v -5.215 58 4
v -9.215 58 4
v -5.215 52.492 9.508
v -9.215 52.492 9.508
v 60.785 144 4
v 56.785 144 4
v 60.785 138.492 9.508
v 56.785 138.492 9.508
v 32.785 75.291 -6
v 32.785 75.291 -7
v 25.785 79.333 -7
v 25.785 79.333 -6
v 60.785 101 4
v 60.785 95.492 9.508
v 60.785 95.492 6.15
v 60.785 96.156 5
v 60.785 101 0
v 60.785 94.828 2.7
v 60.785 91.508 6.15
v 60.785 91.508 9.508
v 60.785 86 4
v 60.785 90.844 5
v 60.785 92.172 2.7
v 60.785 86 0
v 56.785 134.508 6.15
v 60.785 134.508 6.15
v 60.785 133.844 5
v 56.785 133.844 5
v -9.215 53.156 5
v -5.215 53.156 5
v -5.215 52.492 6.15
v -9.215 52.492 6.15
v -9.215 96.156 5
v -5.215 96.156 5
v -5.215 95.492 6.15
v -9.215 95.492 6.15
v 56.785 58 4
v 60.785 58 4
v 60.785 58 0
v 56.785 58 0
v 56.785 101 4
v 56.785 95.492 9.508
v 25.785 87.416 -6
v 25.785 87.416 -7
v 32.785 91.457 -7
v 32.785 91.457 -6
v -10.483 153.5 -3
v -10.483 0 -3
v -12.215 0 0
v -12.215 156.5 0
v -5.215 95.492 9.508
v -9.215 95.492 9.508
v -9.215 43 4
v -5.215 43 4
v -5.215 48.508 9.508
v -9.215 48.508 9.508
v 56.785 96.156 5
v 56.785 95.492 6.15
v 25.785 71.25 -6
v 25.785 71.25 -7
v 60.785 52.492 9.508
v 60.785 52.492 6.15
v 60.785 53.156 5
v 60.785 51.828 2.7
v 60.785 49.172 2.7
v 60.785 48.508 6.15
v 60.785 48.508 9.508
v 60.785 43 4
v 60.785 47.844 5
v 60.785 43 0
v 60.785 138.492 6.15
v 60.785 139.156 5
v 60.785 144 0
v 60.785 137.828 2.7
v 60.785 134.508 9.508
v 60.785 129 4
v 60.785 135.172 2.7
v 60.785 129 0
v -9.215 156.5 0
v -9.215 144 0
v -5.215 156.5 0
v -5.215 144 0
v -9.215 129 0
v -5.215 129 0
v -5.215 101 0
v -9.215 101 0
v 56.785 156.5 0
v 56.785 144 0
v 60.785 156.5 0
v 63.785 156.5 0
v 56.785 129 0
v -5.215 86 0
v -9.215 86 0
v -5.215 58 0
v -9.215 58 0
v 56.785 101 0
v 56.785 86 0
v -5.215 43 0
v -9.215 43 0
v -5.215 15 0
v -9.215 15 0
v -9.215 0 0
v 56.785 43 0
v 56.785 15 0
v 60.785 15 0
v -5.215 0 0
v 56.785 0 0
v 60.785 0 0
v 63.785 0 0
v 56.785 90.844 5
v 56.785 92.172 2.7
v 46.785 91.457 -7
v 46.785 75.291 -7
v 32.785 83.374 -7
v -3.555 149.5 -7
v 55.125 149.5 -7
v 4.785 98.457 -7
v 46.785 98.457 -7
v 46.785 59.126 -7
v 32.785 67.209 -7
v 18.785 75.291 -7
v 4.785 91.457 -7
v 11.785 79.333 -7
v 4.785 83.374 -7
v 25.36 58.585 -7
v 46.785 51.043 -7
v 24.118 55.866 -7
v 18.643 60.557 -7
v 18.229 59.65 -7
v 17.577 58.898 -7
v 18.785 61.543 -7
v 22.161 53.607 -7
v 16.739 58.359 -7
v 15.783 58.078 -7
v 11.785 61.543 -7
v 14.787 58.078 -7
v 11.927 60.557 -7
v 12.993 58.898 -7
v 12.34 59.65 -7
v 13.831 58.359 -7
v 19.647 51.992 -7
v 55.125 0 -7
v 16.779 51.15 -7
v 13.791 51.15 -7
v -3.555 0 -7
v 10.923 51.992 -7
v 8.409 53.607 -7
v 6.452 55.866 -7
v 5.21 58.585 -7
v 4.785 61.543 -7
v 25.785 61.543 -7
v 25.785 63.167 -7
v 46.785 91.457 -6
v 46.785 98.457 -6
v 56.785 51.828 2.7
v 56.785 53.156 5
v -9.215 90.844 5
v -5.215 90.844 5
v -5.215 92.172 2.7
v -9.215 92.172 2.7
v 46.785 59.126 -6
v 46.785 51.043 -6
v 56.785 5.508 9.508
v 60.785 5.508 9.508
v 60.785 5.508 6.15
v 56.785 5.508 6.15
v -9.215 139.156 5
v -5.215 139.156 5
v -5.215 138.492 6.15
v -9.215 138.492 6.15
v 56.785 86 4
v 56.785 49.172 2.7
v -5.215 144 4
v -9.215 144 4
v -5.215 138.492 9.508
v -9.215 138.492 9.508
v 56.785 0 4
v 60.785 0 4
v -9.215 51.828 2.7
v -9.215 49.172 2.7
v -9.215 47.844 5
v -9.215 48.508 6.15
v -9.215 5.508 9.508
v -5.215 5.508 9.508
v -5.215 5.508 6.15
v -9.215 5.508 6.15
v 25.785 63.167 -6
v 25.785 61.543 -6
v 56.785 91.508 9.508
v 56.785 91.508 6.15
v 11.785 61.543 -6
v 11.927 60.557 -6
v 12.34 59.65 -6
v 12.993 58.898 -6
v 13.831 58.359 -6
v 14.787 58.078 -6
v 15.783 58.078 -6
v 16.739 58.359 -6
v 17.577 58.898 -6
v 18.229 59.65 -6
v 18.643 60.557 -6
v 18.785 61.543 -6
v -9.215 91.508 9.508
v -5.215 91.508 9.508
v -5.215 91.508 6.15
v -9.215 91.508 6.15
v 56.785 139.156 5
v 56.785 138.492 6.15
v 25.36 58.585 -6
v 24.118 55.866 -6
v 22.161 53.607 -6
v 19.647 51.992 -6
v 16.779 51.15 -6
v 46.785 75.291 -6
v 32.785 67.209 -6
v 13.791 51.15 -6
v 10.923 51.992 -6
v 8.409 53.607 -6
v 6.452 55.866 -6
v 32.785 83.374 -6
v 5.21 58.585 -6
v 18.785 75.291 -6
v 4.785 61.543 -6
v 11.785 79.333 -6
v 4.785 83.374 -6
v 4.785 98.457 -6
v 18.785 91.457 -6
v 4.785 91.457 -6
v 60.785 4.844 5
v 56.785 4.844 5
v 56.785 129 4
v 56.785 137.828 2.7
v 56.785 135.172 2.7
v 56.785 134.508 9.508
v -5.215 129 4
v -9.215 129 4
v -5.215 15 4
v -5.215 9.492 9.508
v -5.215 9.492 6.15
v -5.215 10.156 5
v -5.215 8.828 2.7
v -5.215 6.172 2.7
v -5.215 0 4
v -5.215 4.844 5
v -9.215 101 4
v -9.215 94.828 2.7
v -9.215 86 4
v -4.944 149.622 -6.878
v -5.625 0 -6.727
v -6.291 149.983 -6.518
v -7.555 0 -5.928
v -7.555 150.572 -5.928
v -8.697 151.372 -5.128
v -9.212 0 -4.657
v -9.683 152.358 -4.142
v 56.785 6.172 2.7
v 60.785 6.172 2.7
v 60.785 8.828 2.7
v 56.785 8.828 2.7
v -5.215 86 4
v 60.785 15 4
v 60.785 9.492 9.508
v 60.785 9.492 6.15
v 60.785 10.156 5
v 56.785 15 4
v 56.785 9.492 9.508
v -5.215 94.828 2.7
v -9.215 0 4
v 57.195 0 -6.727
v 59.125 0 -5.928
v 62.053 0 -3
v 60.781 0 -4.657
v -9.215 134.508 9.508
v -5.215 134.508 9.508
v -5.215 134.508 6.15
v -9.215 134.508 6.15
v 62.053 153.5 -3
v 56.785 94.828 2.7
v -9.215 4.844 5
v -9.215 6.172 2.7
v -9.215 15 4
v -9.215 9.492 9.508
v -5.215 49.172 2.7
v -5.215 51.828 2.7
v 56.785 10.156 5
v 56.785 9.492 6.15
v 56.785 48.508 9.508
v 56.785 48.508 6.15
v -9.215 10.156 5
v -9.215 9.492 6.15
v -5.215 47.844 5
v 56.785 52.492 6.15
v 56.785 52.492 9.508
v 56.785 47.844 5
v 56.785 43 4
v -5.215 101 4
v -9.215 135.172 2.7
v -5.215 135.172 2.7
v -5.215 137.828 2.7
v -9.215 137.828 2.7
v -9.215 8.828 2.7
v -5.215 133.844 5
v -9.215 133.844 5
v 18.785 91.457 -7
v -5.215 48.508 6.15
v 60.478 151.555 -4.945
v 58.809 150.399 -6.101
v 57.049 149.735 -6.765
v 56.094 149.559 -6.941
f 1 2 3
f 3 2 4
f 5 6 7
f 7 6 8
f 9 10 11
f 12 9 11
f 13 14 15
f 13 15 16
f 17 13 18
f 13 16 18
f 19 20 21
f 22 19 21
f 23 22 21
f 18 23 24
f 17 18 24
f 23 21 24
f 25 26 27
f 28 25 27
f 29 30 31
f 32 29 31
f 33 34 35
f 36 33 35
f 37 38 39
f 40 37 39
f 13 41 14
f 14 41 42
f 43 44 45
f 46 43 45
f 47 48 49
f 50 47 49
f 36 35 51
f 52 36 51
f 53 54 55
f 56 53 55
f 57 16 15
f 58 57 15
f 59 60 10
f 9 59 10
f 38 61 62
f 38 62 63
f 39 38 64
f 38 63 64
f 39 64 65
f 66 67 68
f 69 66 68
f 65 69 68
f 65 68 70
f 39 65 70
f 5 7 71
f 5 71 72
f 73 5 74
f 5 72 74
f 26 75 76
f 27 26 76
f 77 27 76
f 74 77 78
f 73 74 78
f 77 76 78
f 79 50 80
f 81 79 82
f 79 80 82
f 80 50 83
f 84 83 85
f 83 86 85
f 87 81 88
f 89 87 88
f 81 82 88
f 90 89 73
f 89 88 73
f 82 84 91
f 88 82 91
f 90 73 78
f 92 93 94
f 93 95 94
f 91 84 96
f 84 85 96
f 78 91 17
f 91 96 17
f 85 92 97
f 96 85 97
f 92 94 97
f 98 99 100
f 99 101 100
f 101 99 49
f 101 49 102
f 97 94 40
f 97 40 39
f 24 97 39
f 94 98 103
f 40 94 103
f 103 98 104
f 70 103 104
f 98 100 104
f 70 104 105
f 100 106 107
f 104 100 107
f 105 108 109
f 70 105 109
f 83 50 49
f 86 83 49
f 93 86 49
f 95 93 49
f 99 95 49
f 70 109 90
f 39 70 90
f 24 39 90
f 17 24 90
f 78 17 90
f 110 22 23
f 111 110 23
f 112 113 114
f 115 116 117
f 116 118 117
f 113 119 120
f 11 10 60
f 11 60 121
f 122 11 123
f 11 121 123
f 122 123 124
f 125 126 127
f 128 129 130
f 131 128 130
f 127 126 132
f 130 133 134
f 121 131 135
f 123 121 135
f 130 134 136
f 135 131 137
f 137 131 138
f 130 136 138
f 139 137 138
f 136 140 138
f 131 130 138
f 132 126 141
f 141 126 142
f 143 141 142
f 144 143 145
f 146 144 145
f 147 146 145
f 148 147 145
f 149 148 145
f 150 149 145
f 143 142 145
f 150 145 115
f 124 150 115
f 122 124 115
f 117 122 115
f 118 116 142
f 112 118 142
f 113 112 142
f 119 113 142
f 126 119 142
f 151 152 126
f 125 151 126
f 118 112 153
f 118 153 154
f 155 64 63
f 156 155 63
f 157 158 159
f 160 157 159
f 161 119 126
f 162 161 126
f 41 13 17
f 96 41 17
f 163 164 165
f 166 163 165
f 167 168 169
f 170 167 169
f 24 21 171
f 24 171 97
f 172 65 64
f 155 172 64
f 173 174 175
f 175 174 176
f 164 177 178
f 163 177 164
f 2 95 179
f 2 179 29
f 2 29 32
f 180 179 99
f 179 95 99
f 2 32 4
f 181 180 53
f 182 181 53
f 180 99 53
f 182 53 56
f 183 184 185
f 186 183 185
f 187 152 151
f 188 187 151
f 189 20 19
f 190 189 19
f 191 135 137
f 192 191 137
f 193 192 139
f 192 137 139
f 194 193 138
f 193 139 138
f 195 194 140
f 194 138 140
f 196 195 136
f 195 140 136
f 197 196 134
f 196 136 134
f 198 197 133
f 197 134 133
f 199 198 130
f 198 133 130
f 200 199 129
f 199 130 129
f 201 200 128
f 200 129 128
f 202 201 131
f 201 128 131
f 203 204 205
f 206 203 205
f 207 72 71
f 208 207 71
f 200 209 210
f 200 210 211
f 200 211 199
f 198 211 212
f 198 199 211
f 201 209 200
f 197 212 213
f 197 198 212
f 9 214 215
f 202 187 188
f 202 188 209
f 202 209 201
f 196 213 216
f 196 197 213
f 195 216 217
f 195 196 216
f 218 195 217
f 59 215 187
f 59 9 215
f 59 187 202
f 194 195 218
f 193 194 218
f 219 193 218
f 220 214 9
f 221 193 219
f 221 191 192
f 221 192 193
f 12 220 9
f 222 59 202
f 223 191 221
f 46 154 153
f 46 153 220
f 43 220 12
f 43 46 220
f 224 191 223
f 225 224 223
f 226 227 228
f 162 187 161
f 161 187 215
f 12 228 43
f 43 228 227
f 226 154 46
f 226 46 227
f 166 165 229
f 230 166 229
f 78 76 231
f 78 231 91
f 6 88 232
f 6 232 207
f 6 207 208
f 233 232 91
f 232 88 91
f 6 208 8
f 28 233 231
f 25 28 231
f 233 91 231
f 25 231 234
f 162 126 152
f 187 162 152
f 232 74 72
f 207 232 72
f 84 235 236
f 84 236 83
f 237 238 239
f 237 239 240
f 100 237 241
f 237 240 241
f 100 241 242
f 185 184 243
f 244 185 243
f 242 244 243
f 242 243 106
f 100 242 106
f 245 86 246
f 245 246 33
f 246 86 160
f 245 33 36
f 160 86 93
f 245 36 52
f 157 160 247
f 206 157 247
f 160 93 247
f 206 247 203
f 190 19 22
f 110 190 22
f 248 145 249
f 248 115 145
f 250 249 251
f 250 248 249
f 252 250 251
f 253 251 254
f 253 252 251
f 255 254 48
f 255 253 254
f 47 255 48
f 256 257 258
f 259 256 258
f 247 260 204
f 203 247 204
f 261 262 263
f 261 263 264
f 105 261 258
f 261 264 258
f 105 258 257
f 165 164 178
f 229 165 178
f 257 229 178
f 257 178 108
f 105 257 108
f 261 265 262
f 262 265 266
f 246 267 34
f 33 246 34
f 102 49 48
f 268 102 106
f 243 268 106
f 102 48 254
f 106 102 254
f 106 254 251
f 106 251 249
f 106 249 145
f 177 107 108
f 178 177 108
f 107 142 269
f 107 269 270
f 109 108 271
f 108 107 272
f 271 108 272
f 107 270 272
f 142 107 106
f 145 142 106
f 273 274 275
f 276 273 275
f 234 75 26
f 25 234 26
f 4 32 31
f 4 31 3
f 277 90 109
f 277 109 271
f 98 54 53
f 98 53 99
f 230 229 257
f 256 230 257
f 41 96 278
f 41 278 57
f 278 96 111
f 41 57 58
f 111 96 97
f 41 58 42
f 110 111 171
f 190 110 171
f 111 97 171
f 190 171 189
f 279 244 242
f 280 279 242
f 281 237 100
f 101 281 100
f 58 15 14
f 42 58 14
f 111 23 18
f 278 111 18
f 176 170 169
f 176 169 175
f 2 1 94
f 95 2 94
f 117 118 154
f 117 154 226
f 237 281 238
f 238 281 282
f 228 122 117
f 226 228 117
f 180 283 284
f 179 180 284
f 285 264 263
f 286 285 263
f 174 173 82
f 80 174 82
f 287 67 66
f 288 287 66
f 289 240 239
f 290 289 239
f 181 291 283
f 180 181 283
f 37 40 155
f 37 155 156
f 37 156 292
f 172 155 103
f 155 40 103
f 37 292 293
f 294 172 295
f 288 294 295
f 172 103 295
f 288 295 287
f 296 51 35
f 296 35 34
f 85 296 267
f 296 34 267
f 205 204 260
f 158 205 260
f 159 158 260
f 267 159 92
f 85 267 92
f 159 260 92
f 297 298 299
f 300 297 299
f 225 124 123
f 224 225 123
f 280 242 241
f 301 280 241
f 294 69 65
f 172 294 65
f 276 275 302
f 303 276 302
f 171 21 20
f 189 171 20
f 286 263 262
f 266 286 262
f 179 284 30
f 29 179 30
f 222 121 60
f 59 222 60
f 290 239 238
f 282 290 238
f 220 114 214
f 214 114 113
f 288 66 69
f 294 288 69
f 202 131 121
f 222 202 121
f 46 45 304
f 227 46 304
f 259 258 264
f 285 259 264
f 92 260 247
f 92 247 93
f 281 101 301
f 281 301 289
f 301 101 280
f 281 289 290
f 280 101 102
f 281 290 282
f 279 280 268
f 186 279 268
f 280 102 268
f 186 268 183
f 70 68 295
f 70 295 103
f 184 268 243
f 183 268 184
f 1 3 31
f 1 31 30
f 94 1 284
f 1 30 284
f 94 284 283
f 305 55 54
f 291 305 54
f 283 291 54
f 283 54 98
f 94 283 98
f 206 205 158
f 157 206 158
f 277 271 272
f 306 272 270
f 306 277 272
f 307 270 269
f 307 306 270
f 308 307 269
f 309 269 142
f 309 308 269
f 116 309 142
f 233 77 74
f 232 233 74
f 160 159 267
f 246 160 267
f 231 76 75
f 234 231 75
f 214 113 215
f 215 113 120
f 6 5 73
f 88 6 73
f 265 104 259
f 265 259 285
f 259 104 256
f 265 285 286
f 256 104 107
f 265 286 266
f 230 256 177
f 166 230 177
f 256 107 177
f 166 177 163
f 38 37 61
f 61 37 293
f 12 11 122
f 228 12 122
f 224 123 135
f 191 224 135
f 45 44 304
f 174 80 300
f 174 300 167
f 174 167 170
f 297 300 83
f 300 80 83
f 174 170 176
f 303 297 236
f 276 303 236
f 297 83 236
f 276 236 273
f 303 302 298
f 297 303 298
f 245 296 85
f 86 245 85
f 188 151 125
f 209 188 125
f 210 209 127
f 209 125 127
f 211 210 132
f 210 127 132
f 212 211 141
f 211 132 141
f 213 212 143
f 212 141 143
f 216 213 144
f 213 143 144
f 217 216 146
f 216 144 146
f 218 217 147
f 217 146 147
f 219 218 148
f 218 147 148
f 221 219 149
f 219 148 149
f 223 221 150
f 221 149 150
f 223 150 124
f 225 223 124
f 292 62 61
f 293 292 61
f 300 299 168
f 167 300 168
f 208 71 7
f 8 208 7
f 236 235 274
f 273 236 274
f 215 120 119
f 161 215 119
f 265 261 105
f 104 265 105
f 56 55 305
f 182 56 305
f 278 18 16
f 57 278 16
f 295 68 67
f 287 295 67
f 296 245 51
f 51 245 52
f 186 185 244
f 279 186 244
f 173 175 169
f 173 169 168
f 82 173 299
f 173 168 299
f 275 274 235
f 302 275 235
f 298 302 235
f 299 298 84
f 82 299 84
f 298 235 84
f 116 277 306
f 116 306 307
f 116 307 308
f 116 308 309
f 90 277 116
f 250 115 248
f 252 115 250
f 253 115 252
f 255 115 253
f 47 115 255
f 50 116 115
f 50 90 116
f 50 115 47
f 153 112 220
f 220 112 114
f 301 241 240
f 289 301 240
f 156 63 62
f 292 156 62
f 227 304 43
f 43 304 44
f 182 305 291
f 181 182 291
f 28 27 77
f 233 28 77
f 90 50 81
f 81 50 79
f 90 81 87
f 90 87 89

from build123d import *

# Parameters (mm, degrees)
BOSS_EXTRUDE1_DEPTH = 156.5
SKETCH4_W           = 37.518488727
SKETCH4_H           = 12.5
CUT_EXTRUDE1_DEPTH  = 173.977599706
SKETCH5_W           = 33.314858612
SKETCH5_H           = 28
CUT_EXTRUDE2_DEPTH  = 173.977599706
CUT_EXTRUDE3_DEPTH  = 170.294892232
LPATTERN1_COUNT     = 4
LPATTERN1_PITCH     = 43
CHAMFER3_SIZE       = 7
FILLET1_R           = 8
CHAMFER5_SIZE       = 6
SKETCH7_W           = 42
SKETCH7_H           = 7
CUT_EXTRUDE4_DEPTH  = 1


# Some blends are built 0.0001 mm under size
with BuildPart() as part:
    # Sketch1 → Boss-Extrude1 (new body)
    with BuildSketch(Plane(origin=(0, 0, 0), x_dir=(1, 0, 0), z_dir=(0, 1, 0))):
        Polygon((-9.215122984, 0), (-9.215122984, -10), (-5.215122984, -10), (-5.215122984, 0), (56.784877016, 0), (56.784877016, -10), (60.784877016, -10), (60.784877016, 0), (63.784877016, 0), (59.743425131, 7), (-8.1736711, 7), (-12.215122984, 0), align=None)
    extrude(amount=BOSS_EXTRUDE1_DEPTH)

    # Sketch4 → Cut-Extrude1 (cut, through all)
    with BuildSketch(Plane(origin=(60.784877016, 0, 0), x_dir=(0, 0, -1), z_dir=(1, 0, 0))):
        with Locations((-18.759244364, 150.25)):
            Rectangle(SKETCH4_W, SKETCH4_H)
    extrude(amount=-CUT_EXTRUDE1_DEPTH, mode=Mode.SUBTRACT)

    # Sketch5 → Cut-Extrude2 (cut, through all)
    with BuildSketch(Plane(origin=(60.784877016, 0, 0), x_dir=(0, 0, -1), z_dir=(1, 0, 0))):
        with Locations((-16.657429306, 115)):
            Rectangle(SKETCH5_W, SKETCH5_H)
    cut_extrude2 = extrude(amount=-CUT_EXTRUDE2_DEPTH, mode=Mode.SUBTRACT)

    # Sketch6 → Cut-Extrude3 (cut, symmetric)
    with BuildSketch(Plane(origin=(0, 0, 0), x_dir=(0, 0, -1), z_dir=(1, 0, 0))):
        Polygon((-7.3, 137.827905619), (-6.15, 138.491858429), (-10, 138.491858429), (-10, 134.508141571), (-6.15, 134.508141571), (-7.3, 135.172094381), align=None)
        Polygon((-5, 133.844188762), (-2.7, 135.172094381), (-2.7, 137.827905619), (-5, 139.155811238), (-7.3, 137.827905619), (-7.3, 135.172094381), align=None)
    cut_extrude3 = extrude(amount=CUT_EXTRUDE3_DEPTH, both=True, mode=Mode.SUBTRACT)

    # LPattern1: Cut-Extrude2, Cut-Extrude3 ×4
    with Locations(*[(0, -i * LPATTERN1_PITCH, 0) for i in range(1, LPATTERN1_COUNT)]):
        add(cut_extrude2, mode=Mode.SUBTRACT)
        add(cut_extrude3, mode=Mode.SUBTRACT)

    # Chamfer3
    chamfer3_edges = [part.edges().sort_by_distance(p)[0] for p in [
        (25.784877016, 156.5, -7),
    ]]
    chamfer(chamfer3_edges, length=CHAMFER3_SIZE - 0.0001)  # a hair under: the kernel refuses the full size

    # Fillet1
    fillet1_edges = [part.edges().sort_by_distance(p)[0] for p in [
        (-8.1736711, 74.75005, -7),
        (59.743425131, 74.75005, -7),
    ]]
    fillet(fillet1_edges, radius=FILLET1_R)

    # Chamfer5
    # the kernel refuses this chamfer: 6 mm, written as the material it takes off along each edge
    with BuildSketch(Plane(origin=(76.214974943, 43, 10), x_dir=(0, -0.027495876610586778, -0.9996219169112968), z_dir=(-1, 0, 0)), Plane(origin=(41.354779088, 144, 10), x_dir=(0, 0.027495876610586778, -0.9996219169112968), z_dir=(1, 0, 0)), Plane(origin=(76.214974943, 129, 10), x_dir=(0, -0.027495876610586778, -0.9996219169112968), z_dir=(-1, 0, 0)), Plane(origin=(-24.645220912, 144, 10), x_dir=(0, 0.027495876610586775, -0.9996219169112968), z_dir=(1, 0, 0)), Plane(origin=(10.214974943, 129, 10), x_dir=(0, -0.027495876610586778, -0.9996219169112968), z_dir=(-1, 0, 0)), Plane(origin=(-24.645220912, 101, 10), x_dir=(0, 0.027495876610586775, -0.9996219169112968), z_dir=(1, 0, 0)), Plane(origin=(10.214974943, 86, 10), x_dir=(0, -0.027495876610586778, -0.9996219169112968), z_dir=(-1, 0, 0)), Plane(origin=(41.354779088, 101, 10), x_dir=(0, 0.027495876610586778, -0.9996219169112968), z_dir=(1, 0, 0)), Plane(origin=(76.214974943, 86, 10), x_dir=(0, -0.027495876610586778, -0.9996219169112968), z_dir=(-1, 0, 0)), Plane(origin=(41.354779088, 58, 10), x_dir=(0, 0.027495876610586778, -0.9996219169112968), z_dir=(1, 0, 0)), Plane(origin=(41.354779088, 15, 10), x_dir=(0, 0.02749587661058649, -0.9996219169112968), z_dir=(1, 0, 0)), Plane(origin=(-24.645220912, 15, 10), x_dir=(0, 0.027495876610586487, -0.9996219169112968), z_dir=(1, 0, 0)), Plane(origin=(-24.645220912, 58, 10), x_dir=(0, 0.027495876610586775, -0.9996219169112968), z_dir=(1, 0, 0)), Plane(origin=(10.214974943, 43, 10), x_dir=(0, -0.027495876610586778, -0.9996219169112968), z_dir=(-1, 0, 0))) as chamfer5_piece_1:
        Polygon((CHAMFER5_SIZE * 0.999621916911, -CHAMFER5_SIZE * 0.0274958766106), (-CHAMFER5_SIZE * 0.0274958766106, -CHAMFER5_SIZE * 0.999621916911), (0, 0), align=None)
    extrude(amount=34.860195856, mode=Mode.SUBTRACT)
    with BuildSketch(Plane(origin=(41.354779088, 0, 10), x_dir=(0, -0.027495876610586372, -0.9996219169112968), z_dir=(1, 0, 0)), Plane(origin=(-24.645220912, 0, 10), x_dir=(0, -0.027495876610586372, -0.9996219169112968), z_dir=(1, 0, 0))) as chamfer5_piece_2:
        Polygon((CHAMFER5_SIZE * 0.999621916911, CHAMFER5_SIZE * 0.0274958766106), (-CHAMFER5_SIZE * 0.0274958766106, CHAMFER5_SIZE * 0.999621916911), (0, 0), align=None)
    extrude(amount=34.860195856, mode=Mode.SUBTRACT)

    # Sketch7 → Cut-Extrude4 (cut)
    with BuildSketch(Plane(origin=(0, 0, -7), x_dir=(-1, 0, 0), z_dir=(0, 0, -1))):
        with Locations((-25.784877016, 94.957259422)):
            Rectangle(SKETCH7_W, SKETCH7_H)
        Polygon((-25.784877016, 79.332903769), (-4.784877016, 91.457259422), (-18.784877016, 91.457259422), (-25.784877016, 87.415807537), (-32.784877016, 91.457259422), (-46.784877016, 91.457259422), (-32.784877016, 83.374355653), align=None)
        Polygon((-32.784877016, 75.291451884), (-25.784877016, 79.332903769), (-32.784877016, 83.374355653), (-46.784877016, 75.291451884), (-32.784877016, 67.208548116), (-25.784877016, 71.25), align=None)
        with BuildLine():
            Line((-18.784877016, 75.291451884), (-25.784877016, 71.25))
            Line((-25.784877016, 71.25), (-32.784877016, 67.208548116))
            Line((-32.784877016, 67.208548116), (-46.784877016, 59.125644347))
            Line((-46.784877016, 59.125644347), (-46.784877016, 51.042740578))
            Line((-46.784877016, 51.042740578), (-25.784877016, 63.167096231))
            Line((-25.784877016, 63.167096231), (-25.784877016, 61.542740578))
            ThreePointArc((-25.784877016, 61.542740578), (-15.284877016, 51.042740578), (-4.784877016, 61.542740578))
            Line((-4.784877016, 61.542740578), (-4.784877016, 83.374355653))
            Line((-4.784877016, 83.374355653), (-11.784877016, 79.332903769))
            Line((-11.784877016, 79.332903769), (-11.784877016, 61.542740578))
            ThreePointArc((-11.784877016, 61.542740578), (-15.284877016, 58.042740578), (-18.784877016, 61.542740578))
            Line((-18.784877016, 61.542740578), (-18.784877016, 75.291451884))
        make_face()
    extrude(amount=-CUT_EXTRUDE4_DEPTH, mode=Mode.SUBTRACT)


solid = part.part
